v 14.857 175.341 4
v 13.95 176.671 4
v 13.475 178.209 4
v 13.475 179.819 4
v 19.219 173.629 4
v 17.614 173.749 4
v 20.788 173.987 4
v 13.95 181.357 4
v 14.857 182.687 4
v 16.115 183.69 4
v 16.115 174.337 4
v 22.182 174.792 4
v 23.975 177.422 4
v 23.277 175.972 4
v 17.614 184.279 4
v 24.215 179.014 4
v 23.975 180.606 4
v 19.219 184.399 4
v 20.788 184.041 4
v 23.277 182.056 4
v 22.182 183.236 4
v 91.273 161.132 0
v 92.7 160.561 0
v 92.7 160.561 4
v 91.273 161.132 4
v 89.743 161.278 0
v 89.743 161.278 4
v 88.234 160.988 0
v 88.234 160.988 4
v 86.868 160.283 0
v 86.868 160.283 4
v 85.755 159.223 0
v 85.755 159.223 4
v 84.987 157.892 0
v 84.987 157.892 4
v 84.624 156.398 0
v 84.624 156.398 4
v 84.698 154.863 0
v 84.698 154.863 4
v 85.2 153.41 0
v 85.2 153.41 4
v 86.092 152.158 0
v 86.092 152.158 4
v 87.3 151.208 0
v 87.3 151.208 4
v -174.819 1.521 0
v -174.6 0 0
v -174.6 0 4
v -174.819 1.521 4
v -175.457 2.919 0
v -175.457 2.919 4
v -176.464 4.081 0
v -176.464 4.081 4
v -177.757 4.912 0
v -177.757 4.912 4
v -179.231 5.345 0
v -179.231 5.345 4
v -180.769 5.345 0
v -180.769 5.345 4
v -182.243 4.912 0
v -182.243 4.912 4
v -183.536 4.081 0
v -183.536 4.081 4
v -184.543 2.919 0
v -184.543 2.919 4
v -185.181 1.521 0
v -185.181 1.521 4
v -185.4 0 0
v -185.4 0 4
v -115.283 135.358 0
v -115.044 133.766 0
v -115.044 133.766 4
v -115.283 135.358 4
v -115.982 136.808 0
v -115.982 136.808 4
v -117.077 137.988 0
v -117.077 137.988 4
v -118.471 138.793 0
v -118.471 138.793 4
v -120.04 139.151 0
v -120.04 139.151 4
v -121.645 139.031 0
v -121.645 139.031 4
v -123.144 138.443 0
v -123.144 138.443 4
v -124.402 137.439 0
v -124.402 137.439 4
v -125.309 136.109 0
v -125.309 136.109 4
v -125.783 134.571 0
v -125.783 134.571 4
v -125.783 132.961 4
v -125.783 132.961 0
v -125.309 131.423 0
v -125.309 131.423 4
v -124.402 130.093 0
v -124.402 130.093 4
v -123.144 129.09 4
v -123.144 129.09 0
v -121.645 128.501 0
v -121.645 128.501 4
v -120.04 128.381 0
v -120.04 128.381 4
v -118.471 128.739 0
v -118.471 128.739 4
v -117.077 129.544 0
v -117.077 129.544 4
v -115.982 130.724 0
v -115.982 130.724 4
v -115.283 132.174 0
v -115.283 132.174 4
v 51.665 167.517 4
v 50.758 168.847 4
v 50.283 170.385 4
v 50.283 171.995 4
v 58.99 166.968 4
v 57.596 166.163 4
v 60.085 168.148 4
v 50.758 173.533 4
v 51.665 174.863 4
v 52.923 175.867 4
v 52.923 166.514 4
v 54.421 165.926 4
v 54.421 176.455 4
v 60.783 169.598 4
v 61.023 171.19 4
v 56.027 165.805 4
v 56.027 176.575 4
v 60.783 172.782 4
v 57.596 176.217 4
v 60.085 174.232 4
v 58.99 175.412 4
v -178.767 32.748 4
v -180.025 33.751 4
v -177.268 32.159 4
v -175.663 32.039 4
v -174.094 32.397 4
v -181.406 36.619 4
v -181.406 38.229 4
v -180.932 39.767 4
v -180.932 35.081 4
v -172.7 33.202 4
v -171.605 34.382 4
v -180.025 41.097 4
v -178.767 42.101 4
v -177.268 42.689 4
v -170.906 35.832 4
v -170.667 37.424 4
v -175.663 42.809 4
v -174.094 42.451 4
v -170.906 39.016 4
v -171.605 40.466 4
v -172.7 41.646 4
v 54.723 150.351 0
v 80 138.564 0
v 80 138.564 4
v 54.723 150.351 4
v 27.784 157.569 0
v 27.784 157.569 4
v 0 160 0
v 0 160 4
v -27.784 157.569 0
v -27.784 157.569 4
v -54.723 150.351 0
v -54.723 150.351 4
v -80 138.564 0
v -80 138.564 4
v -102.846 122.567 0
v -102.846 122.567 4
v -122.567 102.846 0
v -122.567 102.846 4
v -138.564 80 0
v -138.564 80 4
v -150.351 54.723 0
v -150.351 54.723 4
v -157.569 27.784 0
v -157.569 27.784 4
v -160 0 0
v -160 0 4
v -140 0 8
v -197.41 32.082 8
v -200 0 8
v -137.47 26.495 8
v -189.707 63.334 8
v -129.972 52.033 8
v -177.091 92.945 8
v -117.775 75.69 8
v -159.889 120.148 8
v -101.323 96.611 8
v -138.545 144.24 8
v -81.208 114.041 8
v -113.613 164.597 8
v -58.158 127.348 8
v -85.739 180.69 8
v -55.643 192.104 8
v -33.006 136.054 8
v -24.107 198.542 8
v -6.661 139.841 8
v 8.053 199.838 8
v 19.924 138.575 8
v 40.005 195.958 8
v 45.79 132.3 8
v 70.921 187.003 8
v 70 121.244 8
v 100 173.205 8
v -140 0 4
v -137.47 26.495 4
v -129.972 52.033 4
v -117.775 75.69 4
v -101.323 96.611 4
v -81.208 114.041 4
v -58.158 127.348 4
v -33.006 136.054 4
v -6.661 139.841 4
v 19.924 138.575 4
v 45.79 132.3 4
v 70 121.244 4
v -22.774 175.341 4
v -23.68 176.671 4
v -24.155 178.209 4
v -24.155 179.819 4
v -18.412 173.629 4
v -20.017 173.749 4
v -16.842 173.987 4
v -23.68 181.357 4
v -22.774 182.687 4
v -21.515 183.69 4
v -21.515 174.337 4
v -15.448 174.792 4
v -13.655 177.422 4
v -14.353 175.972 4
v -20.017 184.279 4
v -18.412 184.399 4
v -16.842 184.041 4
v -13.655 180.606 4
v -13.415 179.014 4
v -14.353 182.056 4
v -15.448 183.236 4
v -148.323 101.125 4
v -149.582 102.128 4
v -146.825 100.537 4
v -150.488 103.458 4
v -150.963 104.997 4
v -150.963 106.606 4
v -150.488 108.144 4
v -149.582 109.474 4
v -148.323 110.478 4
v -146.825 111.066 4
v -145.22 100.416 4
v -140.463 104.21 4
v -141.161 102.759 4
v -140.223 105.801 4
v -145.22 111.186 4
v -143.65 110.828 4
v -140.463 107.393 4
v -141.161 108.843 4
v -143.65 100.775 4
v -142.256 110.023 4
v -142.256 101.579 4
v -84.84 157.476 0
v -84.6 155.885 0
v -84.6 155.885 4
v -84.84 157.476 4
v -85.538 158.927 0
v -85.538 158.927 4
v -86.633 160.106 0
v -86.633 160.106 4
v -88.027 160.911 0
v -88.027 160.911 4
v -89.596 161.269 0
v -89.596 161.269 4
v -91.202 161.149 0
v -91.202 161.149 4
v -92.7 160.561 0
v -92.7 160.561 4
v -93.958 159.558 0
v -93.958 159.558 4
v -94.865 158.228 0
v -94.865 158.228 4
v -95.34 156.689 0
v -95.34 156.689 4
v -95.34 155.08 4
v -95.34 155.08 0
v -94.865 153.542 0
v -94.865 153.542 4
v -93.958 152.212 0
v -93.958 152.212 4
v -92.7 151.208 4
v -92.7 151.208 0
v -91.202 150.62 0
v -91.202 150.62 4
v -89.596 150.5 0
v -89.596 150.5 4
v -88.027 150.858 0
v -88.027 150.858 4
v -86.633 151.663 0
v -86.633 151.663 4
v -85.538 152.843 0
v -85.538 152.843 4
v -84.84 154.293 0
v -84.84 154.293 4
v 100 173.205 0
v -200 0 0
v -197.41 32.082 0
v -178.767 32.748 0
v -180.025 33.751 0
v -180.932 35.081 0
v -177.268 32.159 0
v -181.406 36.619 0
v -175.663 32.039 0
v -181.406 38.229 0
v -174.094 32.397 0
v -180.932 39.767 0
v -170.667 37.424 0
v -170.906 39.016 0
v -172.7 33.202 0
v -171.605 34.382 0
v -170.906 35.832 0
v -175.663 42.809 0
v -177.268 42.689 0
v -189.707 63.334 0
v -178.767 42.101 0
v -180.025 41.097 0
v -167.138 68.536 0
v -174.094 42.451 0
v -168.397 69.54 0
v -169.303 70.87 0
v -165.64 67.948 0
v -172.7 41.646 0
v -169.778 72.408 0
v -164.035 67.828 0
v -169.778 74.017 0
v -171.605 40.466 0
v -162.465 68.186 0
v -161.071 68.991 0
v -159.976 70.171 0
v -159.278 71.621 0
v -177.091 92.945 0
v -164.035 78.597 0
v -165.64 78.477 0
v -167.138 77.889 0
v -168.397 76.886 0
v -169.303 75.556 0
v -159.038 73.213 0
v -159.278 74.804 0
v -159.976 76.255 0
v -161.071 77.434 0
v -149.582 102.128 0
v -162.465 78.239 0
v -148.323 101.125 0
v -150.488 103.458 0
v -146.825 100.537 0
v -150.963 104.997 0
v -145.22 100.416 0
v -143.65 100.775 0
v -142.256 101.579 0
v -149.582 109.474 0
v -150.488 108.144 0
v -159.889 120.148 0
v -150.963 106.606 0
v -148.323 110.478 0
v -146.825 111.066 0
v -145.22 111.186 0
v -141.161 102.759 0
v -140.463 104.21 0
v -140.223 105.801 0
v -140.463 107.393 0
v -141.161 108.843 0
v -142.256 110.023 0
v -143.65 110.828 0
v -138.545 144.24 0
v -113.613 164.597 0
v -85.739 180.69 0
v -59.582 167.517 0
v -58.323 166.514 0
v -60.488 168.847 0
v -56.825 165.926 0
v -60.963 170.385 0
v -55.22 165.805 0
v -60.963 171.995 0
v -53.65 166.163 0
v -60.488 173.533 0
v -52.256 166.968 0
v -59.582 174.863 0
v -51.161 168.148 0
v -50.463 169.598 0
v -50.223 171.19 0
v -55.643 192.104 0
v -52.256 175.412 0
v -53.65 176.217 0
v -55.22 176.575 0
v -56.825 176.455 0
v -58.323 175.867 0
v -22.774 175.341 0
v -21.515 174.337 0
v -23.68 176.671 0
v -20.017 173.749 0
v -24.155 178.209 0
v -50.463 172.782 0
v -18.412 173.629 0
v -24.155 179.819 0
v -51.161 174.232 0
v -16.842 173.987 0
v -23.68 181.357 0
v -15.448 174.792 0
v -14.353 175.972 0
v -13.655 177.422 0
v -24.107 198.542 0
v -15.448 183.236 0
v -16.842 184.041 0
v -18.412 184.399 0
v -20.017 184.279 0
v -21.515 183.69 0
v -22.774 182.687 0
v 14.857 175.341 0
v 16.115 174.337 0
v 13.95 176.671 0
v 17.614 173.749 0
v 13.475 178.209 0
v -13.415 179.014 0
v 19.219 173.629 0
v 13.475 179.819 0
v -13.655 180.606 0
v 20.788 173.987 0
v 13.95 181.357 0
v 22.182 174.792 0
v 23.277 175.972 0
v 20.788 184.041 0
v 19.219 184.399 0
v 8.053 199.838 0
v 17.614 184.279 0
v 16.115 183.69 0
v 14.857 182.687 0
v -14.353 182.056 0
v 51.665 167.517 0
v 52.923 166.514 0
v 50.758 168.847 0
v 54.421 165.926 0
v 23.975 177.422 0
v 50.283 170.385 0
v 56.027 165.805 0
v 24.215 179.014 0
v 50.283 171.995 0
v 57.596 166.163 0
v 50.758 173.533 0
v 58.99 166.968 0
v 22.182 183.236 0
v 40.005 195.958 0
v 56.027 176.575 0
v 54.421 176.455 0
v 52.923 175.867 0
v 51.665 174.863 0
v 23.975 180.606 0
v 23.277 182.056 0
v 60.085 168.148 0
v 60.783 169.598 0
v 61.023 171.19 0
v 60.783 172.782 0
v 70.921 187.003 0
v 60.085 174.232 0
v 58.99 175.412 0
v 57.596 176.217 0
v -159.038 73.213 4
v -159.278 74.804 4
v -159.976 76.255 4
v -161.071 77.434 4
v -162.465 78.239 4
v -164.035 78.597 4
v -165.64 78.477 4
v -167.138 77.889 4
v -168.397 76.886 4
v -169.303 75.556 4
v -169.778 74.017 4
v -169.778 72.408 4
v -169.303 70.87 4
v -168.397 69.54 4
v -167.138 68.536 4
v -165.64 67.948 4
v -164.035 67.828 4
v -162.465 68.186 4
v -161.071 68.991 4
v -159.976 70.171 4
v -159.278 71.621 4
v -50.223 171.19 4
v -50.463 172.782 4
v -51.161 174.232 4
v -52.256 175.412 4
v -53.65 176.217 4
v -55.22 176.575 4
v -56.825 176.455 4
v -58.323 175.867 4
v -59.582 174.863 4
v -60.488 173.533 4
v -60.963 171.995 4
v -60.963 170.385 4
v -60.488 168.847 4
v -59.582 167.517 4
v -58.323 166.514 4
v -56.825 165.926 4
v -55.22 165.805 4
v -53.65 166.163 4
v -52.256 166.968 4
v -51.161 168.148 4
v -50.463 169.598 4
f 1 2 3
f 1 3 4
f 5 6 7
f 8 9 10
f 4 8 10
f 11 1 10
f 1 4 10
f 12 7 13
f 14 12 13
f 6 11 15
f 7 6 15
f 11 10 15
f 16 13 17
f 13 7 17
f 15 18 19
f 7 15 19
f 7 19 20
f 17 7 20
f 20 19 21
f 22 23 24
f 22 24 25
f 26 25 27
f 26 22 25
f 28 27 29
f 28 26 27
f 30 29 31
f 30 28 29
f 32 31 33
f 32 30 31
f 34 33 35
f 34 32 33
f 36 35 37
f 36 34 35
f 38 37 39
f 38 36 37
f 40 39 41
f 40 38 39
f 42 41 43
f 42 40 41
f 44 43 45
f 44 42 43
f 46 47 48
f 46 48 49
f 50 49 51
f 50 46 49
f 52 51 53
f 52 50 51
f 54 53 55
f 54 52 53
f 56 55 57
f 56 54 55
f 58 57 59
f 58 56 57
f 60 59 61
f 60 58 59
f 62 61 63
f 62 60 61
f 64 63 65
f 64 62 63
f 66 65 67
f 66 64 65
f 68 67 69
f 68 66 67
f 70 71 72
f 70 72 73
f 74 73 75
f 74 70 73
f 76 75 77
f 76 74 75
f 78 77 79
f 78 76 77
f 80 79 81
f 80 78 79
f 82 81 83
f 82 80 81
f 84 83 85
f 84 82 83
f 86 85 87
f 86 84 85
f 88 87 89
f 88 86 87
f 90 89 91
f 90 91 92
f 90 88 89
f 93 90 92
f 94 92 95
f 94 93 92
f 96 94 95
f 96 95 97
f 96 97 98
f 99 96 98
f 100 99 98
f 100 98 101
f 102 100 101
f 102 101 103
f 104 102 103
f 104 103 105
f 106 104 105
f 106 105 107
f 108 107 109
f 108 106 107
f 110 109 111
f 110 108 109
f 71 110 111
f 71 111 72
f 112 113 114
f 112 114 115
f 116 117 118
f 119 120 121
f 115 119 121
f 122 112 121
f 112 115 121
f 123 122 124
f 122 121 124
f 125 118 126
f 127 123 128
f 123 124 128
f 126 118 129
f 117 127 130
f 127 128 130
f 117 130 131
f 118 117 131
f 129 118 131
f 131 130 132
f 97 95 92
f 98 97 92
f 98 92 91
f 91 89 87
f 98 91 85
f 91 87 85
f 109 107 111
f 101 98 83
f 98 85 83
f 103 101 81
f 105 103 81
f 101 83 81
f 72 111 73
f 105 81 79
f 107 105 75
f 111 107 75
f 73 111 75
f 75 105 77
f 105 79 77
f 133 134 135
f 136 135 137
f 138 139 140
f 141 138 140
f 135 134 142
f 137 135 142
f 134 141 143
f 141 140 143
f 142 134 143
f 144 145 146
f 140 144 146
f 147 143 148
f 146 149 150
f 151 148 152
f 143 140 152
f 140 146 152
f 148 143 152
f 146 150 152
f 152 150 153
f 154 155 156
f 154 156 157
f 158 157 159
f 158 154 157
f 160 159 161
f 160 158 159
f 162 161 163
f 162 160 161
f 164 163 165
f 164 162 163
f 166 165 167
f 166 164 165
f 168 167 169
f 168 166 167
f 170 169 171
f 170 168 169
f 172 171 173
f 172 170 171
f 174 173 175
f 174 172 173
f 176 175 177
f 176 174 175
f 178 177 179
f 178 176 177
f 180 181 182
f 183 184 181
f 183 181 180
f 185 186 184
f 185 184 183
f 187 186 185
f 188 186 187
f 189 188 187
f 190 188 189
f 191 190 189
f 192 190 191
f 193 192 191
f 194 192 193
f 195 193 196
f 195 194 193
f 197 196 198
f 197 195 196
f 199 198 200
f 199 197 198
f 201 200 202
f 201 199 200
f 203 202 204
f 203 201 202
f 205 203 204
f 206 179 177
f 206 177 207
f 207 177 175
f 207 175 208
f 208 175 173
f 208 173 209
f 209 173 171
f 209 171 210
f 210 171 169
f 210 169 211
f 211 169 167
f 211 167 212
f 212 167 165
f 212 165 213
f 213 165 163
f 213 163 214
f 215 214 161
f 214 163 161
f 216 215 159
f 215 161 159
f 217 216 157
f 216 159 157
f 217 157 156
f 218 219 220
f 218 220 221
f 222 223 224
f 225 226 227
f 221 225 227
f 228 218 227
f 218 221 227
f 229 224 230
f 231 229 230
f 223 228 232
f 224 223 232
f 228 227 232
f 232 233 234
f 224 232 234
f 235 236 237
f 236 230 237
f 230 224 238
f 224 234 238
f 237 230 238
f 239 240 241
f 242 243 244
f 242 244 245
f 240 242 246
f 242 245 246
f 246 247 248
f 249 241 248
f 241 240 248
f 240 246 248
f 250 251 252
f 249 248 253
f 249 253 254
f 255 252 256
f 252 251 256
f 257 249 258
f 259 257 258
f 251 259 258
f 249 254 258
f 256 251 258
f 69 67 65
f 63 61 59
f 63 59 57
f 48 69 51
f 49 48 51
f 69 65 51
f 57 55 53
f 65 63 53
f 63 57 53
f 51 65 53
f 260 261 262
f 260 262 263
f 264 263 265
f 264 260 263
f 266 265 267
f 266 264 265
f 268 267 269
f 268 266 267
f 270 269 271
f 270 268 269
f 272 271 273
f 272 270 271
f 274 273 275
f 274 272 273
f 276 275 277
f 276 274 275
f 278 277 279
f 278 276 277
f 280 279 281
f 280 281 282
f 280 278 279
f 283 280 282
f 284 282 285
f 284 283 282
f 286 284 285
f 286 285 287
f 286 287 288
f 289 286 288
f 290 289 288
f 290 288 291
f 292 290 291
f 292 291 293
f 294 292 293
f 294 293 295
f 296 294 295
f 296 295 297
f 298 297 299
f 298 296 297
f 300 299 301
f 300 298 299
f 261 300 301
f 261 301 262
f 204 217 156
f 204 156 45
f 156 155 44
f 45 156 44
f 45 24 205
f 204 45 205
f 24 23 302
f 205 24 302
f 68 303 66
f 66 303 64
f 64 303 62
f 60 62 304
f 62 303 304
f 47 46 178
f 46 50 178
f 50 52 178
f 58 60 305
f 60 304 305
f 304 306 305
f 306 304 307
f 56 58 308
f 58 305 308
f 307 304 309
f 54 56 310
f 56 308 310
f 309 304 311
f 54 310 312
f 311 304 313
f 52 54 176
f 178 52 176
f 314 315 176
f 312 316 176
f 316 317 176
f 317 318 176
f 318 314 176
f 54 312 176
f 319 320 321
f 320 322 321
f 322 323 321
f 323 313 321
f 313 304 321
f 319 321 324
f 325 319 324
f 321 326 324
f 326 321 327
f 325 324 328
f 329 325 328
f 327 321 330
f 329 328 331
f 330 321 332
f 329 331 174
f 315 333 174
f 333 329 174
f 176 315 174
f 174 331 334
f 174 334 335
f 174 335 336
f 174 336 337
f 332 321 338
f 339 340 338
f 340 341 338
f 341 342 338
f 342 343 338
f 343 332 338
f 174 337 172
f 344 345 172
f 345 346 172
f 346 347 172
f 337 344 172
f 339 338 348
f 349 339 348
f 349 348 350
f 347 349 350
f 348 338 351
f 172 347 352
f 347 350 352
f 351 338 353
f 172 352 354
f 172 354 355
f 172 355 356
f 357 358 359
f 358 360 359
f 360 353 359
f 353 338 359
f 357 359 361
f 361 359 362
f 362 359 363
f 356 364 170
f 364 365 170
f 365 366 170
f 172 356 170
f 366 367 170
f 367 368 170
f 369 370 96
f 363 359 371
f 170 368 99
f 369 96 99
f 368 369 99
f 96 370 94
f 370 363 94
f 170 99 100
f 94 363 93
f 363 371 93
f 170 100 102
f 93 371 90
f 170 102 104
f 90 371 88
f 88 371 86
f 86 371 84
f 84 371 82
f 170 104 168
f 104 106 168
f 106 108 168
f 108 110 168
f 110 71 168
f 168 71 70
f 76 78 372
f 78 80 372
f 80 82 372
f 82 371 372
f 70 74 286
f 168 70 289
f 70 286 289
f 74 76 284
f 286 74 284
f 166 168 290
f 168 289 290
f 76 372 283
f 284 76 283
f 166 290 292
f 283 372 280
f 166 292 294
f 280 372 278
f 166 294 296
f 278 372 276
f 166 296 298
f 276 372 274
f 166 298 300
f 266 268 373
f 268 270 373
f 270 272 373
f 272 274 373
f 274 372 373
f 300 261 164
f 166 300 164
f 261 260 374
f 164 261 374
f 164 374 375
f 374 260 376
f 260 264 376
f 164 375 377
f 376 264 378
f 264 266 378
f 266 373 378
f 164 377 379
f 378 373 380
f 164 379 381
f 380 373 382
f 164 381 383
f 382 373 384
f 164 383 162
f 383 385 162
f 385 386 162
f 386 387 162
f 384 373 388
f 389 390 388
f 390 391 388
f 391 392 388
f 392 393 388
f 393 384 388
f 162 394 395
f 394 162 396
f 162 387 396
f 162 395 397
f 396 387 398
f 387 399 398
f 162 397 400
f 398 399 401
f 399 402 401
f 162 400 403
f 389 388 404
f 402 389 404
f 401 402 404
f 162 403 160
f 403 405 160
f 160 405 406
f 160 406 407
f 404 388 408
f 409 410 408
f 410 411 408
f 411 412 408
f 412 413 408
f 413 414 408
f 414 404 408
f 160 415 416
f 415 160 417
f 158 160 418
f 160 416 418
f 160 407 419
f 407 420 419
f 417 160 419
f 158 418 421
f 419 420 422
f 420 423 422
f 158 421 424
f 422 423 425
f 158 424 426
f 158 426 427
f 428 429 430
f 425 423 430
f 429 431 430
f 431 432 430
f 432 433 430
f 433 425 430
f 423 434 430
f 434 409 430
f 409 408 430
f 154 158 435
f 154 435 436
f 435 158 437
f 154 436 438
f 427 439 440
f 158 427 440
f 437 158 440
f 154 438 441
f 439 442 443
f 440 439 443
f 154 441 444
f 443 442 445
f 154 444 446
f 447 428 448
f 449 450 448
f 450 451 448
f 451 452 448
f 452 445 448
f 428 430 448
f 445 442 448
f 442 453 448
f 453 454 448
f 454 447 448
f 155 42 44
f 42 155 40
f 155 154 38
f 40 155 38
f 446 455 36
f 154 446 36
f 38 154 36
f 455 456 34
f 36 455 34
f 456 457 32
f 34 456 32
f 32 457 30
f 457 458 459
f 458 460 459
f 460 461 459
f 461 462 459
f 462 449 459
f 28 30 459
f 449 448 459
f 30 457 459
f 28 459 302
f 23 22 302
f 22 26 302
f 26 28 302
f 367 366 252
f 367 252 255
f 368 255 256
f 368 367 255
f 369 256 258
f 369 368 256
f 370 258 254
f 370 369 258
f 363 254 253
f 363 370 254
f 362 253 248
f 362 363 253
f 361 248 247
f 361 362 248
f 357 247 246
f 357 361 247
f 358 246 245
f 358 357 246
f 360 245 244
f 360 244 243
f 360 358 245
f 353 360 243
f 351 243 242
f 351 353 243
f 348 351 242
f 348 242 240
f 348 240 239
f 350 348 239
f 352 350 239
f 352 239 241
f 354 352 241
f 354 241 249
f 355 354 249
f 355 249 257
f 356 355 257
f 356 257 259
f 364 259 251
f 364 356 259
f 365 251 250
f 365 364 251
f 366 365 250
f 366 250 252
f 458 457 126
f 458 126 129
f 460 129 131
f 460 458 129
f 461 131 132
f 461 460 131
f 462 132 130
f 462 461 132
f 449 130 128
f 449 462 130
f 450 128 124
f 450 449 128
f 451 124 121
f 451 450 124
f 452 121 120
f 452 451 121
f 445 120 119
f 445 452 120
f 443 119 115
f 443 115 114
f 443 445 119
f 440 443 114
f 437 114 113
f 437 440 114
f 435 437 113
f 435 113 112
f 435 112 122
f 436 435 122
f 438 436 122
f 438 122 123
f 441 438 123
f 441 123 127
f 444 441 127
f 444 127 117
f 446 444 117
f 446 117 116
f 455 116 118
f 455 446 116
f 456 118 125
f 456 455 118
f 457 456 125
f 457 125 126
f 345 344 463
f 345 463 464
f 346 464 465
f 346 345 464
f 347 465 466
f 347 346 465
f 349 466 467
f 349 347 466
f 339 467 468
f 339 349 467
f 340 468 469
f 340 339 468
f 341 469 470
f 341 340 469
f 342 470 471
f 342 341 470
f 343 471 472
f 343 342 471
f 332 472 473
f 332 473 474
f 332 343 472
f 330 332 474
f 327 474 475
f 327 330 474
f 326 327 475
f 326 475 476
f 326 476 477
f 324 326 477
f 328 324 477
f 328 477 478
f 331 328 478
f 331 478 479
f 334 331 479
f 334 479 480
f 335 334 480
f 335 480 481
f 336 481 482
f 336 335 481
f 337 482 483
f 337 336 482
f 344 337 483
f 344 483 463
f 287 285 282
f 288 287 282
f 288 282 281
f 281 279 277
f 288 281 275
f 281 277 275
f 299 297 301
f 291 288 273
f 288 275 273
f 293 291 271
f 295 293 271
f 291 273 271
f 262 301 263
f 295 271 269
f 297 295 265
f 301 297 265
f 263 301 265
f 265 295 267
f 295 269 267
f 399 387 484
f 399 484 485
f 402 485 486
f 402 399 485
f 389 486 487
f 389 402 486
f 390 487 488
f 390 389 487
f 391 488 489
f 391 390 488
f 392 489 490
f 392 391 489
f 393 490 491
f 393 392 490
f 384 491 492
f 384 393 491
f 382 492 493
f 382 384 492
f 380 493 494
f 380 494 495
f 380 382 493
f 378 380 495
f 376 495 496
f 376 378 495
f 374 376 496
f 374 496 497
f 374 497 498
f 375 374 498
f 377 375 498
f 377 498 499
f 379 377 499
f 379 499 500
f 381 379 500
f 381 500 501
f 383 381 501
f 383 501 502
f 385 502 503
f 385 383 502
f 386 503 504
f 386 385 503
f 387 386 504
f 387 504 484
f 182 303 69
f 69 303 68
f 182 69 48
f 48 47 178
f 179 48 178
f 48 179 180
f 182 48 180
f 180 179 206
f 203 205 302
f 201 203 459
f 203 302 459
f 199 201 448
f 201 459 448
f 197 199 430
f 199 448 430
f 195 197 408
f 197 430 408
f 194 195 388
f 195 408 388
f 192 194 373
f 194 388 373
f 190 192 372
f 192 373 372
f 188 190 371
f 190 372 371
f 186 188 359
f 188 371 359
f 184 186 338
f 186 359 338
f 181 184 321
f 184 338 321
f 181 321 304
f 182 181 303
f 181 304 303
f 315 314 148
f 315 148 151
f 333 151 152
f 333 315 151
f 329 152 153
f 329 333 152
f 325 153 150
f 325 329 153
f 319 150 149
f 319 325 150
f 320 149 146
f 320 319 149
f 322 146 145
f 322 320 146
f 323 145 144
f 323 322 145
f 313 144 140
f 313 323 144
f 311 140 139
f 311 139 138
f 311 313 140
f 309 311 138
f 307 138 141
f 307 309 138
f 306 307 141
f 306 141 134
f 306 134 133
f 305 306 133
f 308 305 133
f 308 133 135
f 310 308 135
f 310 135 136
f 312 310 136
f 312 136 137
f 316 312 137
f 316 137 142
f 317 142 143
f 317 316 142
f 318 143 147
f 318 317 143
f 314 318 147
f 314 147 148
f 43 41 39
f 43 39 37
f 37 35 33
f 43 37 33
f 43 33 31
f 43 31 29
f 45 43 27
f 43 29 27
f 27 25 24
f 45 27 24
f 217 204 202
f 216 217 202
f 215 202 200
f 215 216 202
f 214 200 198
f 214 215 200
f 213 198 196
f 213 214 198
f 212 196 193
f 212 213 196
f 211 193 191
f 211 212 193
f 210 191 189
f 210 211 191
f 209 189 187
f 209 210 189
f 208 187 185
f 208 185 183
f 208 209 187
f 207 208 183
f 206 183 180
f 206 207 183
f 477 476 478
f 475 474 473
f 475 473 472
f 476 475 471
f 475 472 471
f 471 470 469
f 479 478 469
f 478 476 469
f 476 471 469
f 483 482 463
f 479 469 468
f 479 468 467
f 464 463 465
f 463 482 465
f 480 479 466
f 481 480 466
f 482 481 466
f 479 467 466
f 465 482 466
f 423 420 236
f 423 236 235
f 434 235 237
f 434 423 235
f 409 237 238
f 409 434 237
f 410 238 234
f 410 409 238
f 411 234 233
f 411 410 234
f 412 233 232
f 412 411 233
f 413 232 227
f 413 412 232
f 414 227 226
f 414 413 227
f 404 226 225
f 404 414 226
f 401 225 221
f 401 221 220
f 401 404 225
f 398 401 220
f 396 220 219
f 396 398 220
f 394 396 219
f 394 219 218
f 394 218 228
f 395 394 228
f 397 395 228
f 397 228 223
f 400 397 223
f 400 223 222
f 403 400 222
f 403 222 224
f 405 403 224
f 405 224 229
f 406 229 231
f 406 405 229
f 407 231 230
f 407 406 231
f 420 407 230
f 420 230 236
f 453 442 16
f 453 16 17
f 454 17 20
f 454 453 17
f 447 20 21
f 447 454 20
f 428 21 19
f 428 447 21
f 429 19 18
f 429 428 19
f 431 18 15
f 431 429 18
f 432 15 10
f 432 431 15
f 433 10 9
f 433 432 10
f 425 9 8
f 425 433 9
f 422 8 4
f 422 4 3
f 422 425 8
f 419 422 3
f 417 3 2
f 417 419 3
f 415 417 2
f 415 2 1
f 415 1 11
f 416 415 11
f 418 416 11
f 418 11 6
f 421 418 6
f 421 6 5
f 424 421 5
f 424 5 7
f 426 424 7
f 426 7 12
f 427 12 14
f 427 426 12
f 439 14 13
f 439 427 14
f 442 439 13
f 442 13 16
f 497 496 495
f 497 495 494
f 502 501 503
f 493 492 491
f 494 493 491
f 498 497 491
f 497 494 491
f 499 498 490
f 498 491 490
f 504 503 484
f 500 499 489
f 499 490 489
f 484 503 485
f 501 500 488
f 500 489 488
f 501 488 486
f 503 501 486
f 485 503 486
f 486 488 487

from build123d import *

# Parameters (mm, degrees)
CROQUIS1_R              = 200
CROQUIS1_R_2            = 160
CROQUIS1_R_3            = 5.4
SALIENTE_EXTRUIR1_DEPTH = 4
CROQUIS2_R              = 200
CROQUIS2_R_2            = 140
SALIENTE_EXTRUIR2_DEPTH = 4
CORTAR_EXTRUIR1_DEPTH   = 10


with BuildPart() as part:
    # Croquis1 → Saliente-Extruir1 (new body)
    with BuildSketch(Plane.XY):
        Circle(CROQUIS1_R)
        Circle(CROQUIS1_R_2, mode=Mode.SUBTRACT)
        with Locations((145.623058987, 105.801345413)):
            Circle(CROQUIS1_R_3, mode=Mode.SUBTRACT)
        with Locations((164.438182376, 73.212595754)):
            Circle(CROQUIS1_R_3, mode=Mode.SUBTRACT)
        with Locations((176.066568132, 37.424104347)):
            Circle(CROQUIS1_R_3, mode=Mode.SUBTRACT)
        with Locations((180, 0)):
            Circle(CROQUIS1_R_3, mode=Mode.SUBTRACT)
        with Locations((176.066568132, -37.424104347)):
            Circle(CROQUIS1_R_3, mode=Mode.SUBTRACT)
        with Locations((164.438182376, -73.212595754)):
            Circle(CROQUIS1_R_3, mode=Mode.SUBTRACT)
        with Locations((145.623058987, -105.801345413)):
            Circle(CROQUIS1_R_3, mode=Mode.SUBTRACT)
        with Locations((120.443509145, -133.766068586)):
            Circle(CROQUIS1_R_3, mode=Mode.SUBTRACT)
        with Locations((90, -155.884572681)):
            Circle(CROQUIS1_R_3, mode=Mode.SUBTRACT)
        with Locations((55.623058987, -171.190172933)):
            Circle(CROQUIS1_R_3, mode=Mode.SUBTRACT)
        with Locations((18.815123388, -179.013941166)):
            Circle(CROQUIS1_R_3, mode=Mode.SUBTRACT)
        with Locations((-18.815123388, -179.013941166)):
            Circle(CROQUIS1_R_3, mode=Mode.SUBTRACT)
        with Locations((-55.623058987, -171.190172933)):
            Circle(CROQUIS1_R_3, mode=Mode.SUBTRACT)
        with Locations((-90, -155.884572681)):
            Circle(CROQUIS1_R_3, mode=Mode.SUBTRACT)
        with Locations((-120.443509145, -133.766068586)):
            Circle(CROQUIS1_R_3, mode=Mode.SUBTRACT)
        with Locations((-145.623058987, -105.801345413)):
            Circle(CROQUIS1_R_3, mode=Mode.SUBTRACT)
        with Locations((-164.438182376, -73.212595754)):
            Circle(CROQUIS1_R_3, mode=Mode.SUBTRACT)
        with Locations((-176.066568132, -37.424104347)):
            Circle(CROQUIS1_R_3, mode=Mode.SUBTRACT)
        with Locations((-180, 0)):
            Circle(CROQUIS1_R_3, mode=Mode.SUBTRACT)
        with Locations((-176.066568132, 37.424104347)):
            Circle(CROQUIS1_R_3, mode=Mode.SUBTRACT)
        with Locations((-164.438182376, 73.212595754)):
            Circle(CROQUIS1_R_3, mode=Mode.SUBTRACT)
        with Locations((-145.623058987, 105.801345413)):
            Circle(CROQUIS1_R_3, mode=Mode.SUBTRACT)
        with Locations((-120.443509145, 133.766068586)):
            Circle(CROQUIS1_R_3, mode=Mode.SUBTRACT)
        with Locations((-90, 155.884572681)):
            Circle(CROQUIS1_R_3, mode=Mode.SUBTRACT)
        with Locations((-55.623058987, 171.190172933)):
            Circle(CROQUIS1_R_3, mode=Mode.SUBTRACT)
        with Locations((-18.815123388, 179.013941166)):
            Circle(CROQUIS1_R_3, mode=Mode.SUBTRACT)
        with Locations((18.815123388, 179.013941166)):
            Circle(CROQUIS1_R_3, mode=Mode.SUBTRACT)
        with Locations((55.623058987, 171.190172933)):
            Circle(CROQUIS1_R_3, mode=Mode.SUBTRACT)
        with Locations((90, 155.884572681)):
            Circle(CROQUIS1_R_3, mode=Mode.SUBTRACT)
        with Locations((120.443509145, 133.766068586)):
            Circle(CROQUIS1_R_3, mode=Mode.SUBTRACT)
    extrude(amount=SALIENTE_EXTRUIR1_DEPTH)

    # Croquis2 → Saliente-Extruir2 (add)
    with BuildSketch(Plane.XY.offset(4)):
        Circle(CROQUIS2_R)
        Circle(CROQUIS2_R_2, mode=Mode.SUBTRACT)
    extrude(amount=SALIENTE_EXTRUIR2_DEPTH)

    # Croquis3 → Cortar-Extruir1 (cut)
    with BuildSketch(Plane(origin=(0, 0, 0), x_dir=(-1, 0, 0), z_dir=(0, 0, -1))):
        Polygon((-100, 173.205080757), (-166.23575866, 173.205080757), (-252.111103181, -105.177600858), (-104.783677259, -222.566833277), (177.265619424, -205.234194933), (232.312426825, -26.788589339), (200, 0), (140, 0), (-70, 121.24355653), align=None)
    extrude(amount=-CORTAR_EXTRUIR1_DEPTH, mode=Mode.SUBTRACT)


solid = part.part
